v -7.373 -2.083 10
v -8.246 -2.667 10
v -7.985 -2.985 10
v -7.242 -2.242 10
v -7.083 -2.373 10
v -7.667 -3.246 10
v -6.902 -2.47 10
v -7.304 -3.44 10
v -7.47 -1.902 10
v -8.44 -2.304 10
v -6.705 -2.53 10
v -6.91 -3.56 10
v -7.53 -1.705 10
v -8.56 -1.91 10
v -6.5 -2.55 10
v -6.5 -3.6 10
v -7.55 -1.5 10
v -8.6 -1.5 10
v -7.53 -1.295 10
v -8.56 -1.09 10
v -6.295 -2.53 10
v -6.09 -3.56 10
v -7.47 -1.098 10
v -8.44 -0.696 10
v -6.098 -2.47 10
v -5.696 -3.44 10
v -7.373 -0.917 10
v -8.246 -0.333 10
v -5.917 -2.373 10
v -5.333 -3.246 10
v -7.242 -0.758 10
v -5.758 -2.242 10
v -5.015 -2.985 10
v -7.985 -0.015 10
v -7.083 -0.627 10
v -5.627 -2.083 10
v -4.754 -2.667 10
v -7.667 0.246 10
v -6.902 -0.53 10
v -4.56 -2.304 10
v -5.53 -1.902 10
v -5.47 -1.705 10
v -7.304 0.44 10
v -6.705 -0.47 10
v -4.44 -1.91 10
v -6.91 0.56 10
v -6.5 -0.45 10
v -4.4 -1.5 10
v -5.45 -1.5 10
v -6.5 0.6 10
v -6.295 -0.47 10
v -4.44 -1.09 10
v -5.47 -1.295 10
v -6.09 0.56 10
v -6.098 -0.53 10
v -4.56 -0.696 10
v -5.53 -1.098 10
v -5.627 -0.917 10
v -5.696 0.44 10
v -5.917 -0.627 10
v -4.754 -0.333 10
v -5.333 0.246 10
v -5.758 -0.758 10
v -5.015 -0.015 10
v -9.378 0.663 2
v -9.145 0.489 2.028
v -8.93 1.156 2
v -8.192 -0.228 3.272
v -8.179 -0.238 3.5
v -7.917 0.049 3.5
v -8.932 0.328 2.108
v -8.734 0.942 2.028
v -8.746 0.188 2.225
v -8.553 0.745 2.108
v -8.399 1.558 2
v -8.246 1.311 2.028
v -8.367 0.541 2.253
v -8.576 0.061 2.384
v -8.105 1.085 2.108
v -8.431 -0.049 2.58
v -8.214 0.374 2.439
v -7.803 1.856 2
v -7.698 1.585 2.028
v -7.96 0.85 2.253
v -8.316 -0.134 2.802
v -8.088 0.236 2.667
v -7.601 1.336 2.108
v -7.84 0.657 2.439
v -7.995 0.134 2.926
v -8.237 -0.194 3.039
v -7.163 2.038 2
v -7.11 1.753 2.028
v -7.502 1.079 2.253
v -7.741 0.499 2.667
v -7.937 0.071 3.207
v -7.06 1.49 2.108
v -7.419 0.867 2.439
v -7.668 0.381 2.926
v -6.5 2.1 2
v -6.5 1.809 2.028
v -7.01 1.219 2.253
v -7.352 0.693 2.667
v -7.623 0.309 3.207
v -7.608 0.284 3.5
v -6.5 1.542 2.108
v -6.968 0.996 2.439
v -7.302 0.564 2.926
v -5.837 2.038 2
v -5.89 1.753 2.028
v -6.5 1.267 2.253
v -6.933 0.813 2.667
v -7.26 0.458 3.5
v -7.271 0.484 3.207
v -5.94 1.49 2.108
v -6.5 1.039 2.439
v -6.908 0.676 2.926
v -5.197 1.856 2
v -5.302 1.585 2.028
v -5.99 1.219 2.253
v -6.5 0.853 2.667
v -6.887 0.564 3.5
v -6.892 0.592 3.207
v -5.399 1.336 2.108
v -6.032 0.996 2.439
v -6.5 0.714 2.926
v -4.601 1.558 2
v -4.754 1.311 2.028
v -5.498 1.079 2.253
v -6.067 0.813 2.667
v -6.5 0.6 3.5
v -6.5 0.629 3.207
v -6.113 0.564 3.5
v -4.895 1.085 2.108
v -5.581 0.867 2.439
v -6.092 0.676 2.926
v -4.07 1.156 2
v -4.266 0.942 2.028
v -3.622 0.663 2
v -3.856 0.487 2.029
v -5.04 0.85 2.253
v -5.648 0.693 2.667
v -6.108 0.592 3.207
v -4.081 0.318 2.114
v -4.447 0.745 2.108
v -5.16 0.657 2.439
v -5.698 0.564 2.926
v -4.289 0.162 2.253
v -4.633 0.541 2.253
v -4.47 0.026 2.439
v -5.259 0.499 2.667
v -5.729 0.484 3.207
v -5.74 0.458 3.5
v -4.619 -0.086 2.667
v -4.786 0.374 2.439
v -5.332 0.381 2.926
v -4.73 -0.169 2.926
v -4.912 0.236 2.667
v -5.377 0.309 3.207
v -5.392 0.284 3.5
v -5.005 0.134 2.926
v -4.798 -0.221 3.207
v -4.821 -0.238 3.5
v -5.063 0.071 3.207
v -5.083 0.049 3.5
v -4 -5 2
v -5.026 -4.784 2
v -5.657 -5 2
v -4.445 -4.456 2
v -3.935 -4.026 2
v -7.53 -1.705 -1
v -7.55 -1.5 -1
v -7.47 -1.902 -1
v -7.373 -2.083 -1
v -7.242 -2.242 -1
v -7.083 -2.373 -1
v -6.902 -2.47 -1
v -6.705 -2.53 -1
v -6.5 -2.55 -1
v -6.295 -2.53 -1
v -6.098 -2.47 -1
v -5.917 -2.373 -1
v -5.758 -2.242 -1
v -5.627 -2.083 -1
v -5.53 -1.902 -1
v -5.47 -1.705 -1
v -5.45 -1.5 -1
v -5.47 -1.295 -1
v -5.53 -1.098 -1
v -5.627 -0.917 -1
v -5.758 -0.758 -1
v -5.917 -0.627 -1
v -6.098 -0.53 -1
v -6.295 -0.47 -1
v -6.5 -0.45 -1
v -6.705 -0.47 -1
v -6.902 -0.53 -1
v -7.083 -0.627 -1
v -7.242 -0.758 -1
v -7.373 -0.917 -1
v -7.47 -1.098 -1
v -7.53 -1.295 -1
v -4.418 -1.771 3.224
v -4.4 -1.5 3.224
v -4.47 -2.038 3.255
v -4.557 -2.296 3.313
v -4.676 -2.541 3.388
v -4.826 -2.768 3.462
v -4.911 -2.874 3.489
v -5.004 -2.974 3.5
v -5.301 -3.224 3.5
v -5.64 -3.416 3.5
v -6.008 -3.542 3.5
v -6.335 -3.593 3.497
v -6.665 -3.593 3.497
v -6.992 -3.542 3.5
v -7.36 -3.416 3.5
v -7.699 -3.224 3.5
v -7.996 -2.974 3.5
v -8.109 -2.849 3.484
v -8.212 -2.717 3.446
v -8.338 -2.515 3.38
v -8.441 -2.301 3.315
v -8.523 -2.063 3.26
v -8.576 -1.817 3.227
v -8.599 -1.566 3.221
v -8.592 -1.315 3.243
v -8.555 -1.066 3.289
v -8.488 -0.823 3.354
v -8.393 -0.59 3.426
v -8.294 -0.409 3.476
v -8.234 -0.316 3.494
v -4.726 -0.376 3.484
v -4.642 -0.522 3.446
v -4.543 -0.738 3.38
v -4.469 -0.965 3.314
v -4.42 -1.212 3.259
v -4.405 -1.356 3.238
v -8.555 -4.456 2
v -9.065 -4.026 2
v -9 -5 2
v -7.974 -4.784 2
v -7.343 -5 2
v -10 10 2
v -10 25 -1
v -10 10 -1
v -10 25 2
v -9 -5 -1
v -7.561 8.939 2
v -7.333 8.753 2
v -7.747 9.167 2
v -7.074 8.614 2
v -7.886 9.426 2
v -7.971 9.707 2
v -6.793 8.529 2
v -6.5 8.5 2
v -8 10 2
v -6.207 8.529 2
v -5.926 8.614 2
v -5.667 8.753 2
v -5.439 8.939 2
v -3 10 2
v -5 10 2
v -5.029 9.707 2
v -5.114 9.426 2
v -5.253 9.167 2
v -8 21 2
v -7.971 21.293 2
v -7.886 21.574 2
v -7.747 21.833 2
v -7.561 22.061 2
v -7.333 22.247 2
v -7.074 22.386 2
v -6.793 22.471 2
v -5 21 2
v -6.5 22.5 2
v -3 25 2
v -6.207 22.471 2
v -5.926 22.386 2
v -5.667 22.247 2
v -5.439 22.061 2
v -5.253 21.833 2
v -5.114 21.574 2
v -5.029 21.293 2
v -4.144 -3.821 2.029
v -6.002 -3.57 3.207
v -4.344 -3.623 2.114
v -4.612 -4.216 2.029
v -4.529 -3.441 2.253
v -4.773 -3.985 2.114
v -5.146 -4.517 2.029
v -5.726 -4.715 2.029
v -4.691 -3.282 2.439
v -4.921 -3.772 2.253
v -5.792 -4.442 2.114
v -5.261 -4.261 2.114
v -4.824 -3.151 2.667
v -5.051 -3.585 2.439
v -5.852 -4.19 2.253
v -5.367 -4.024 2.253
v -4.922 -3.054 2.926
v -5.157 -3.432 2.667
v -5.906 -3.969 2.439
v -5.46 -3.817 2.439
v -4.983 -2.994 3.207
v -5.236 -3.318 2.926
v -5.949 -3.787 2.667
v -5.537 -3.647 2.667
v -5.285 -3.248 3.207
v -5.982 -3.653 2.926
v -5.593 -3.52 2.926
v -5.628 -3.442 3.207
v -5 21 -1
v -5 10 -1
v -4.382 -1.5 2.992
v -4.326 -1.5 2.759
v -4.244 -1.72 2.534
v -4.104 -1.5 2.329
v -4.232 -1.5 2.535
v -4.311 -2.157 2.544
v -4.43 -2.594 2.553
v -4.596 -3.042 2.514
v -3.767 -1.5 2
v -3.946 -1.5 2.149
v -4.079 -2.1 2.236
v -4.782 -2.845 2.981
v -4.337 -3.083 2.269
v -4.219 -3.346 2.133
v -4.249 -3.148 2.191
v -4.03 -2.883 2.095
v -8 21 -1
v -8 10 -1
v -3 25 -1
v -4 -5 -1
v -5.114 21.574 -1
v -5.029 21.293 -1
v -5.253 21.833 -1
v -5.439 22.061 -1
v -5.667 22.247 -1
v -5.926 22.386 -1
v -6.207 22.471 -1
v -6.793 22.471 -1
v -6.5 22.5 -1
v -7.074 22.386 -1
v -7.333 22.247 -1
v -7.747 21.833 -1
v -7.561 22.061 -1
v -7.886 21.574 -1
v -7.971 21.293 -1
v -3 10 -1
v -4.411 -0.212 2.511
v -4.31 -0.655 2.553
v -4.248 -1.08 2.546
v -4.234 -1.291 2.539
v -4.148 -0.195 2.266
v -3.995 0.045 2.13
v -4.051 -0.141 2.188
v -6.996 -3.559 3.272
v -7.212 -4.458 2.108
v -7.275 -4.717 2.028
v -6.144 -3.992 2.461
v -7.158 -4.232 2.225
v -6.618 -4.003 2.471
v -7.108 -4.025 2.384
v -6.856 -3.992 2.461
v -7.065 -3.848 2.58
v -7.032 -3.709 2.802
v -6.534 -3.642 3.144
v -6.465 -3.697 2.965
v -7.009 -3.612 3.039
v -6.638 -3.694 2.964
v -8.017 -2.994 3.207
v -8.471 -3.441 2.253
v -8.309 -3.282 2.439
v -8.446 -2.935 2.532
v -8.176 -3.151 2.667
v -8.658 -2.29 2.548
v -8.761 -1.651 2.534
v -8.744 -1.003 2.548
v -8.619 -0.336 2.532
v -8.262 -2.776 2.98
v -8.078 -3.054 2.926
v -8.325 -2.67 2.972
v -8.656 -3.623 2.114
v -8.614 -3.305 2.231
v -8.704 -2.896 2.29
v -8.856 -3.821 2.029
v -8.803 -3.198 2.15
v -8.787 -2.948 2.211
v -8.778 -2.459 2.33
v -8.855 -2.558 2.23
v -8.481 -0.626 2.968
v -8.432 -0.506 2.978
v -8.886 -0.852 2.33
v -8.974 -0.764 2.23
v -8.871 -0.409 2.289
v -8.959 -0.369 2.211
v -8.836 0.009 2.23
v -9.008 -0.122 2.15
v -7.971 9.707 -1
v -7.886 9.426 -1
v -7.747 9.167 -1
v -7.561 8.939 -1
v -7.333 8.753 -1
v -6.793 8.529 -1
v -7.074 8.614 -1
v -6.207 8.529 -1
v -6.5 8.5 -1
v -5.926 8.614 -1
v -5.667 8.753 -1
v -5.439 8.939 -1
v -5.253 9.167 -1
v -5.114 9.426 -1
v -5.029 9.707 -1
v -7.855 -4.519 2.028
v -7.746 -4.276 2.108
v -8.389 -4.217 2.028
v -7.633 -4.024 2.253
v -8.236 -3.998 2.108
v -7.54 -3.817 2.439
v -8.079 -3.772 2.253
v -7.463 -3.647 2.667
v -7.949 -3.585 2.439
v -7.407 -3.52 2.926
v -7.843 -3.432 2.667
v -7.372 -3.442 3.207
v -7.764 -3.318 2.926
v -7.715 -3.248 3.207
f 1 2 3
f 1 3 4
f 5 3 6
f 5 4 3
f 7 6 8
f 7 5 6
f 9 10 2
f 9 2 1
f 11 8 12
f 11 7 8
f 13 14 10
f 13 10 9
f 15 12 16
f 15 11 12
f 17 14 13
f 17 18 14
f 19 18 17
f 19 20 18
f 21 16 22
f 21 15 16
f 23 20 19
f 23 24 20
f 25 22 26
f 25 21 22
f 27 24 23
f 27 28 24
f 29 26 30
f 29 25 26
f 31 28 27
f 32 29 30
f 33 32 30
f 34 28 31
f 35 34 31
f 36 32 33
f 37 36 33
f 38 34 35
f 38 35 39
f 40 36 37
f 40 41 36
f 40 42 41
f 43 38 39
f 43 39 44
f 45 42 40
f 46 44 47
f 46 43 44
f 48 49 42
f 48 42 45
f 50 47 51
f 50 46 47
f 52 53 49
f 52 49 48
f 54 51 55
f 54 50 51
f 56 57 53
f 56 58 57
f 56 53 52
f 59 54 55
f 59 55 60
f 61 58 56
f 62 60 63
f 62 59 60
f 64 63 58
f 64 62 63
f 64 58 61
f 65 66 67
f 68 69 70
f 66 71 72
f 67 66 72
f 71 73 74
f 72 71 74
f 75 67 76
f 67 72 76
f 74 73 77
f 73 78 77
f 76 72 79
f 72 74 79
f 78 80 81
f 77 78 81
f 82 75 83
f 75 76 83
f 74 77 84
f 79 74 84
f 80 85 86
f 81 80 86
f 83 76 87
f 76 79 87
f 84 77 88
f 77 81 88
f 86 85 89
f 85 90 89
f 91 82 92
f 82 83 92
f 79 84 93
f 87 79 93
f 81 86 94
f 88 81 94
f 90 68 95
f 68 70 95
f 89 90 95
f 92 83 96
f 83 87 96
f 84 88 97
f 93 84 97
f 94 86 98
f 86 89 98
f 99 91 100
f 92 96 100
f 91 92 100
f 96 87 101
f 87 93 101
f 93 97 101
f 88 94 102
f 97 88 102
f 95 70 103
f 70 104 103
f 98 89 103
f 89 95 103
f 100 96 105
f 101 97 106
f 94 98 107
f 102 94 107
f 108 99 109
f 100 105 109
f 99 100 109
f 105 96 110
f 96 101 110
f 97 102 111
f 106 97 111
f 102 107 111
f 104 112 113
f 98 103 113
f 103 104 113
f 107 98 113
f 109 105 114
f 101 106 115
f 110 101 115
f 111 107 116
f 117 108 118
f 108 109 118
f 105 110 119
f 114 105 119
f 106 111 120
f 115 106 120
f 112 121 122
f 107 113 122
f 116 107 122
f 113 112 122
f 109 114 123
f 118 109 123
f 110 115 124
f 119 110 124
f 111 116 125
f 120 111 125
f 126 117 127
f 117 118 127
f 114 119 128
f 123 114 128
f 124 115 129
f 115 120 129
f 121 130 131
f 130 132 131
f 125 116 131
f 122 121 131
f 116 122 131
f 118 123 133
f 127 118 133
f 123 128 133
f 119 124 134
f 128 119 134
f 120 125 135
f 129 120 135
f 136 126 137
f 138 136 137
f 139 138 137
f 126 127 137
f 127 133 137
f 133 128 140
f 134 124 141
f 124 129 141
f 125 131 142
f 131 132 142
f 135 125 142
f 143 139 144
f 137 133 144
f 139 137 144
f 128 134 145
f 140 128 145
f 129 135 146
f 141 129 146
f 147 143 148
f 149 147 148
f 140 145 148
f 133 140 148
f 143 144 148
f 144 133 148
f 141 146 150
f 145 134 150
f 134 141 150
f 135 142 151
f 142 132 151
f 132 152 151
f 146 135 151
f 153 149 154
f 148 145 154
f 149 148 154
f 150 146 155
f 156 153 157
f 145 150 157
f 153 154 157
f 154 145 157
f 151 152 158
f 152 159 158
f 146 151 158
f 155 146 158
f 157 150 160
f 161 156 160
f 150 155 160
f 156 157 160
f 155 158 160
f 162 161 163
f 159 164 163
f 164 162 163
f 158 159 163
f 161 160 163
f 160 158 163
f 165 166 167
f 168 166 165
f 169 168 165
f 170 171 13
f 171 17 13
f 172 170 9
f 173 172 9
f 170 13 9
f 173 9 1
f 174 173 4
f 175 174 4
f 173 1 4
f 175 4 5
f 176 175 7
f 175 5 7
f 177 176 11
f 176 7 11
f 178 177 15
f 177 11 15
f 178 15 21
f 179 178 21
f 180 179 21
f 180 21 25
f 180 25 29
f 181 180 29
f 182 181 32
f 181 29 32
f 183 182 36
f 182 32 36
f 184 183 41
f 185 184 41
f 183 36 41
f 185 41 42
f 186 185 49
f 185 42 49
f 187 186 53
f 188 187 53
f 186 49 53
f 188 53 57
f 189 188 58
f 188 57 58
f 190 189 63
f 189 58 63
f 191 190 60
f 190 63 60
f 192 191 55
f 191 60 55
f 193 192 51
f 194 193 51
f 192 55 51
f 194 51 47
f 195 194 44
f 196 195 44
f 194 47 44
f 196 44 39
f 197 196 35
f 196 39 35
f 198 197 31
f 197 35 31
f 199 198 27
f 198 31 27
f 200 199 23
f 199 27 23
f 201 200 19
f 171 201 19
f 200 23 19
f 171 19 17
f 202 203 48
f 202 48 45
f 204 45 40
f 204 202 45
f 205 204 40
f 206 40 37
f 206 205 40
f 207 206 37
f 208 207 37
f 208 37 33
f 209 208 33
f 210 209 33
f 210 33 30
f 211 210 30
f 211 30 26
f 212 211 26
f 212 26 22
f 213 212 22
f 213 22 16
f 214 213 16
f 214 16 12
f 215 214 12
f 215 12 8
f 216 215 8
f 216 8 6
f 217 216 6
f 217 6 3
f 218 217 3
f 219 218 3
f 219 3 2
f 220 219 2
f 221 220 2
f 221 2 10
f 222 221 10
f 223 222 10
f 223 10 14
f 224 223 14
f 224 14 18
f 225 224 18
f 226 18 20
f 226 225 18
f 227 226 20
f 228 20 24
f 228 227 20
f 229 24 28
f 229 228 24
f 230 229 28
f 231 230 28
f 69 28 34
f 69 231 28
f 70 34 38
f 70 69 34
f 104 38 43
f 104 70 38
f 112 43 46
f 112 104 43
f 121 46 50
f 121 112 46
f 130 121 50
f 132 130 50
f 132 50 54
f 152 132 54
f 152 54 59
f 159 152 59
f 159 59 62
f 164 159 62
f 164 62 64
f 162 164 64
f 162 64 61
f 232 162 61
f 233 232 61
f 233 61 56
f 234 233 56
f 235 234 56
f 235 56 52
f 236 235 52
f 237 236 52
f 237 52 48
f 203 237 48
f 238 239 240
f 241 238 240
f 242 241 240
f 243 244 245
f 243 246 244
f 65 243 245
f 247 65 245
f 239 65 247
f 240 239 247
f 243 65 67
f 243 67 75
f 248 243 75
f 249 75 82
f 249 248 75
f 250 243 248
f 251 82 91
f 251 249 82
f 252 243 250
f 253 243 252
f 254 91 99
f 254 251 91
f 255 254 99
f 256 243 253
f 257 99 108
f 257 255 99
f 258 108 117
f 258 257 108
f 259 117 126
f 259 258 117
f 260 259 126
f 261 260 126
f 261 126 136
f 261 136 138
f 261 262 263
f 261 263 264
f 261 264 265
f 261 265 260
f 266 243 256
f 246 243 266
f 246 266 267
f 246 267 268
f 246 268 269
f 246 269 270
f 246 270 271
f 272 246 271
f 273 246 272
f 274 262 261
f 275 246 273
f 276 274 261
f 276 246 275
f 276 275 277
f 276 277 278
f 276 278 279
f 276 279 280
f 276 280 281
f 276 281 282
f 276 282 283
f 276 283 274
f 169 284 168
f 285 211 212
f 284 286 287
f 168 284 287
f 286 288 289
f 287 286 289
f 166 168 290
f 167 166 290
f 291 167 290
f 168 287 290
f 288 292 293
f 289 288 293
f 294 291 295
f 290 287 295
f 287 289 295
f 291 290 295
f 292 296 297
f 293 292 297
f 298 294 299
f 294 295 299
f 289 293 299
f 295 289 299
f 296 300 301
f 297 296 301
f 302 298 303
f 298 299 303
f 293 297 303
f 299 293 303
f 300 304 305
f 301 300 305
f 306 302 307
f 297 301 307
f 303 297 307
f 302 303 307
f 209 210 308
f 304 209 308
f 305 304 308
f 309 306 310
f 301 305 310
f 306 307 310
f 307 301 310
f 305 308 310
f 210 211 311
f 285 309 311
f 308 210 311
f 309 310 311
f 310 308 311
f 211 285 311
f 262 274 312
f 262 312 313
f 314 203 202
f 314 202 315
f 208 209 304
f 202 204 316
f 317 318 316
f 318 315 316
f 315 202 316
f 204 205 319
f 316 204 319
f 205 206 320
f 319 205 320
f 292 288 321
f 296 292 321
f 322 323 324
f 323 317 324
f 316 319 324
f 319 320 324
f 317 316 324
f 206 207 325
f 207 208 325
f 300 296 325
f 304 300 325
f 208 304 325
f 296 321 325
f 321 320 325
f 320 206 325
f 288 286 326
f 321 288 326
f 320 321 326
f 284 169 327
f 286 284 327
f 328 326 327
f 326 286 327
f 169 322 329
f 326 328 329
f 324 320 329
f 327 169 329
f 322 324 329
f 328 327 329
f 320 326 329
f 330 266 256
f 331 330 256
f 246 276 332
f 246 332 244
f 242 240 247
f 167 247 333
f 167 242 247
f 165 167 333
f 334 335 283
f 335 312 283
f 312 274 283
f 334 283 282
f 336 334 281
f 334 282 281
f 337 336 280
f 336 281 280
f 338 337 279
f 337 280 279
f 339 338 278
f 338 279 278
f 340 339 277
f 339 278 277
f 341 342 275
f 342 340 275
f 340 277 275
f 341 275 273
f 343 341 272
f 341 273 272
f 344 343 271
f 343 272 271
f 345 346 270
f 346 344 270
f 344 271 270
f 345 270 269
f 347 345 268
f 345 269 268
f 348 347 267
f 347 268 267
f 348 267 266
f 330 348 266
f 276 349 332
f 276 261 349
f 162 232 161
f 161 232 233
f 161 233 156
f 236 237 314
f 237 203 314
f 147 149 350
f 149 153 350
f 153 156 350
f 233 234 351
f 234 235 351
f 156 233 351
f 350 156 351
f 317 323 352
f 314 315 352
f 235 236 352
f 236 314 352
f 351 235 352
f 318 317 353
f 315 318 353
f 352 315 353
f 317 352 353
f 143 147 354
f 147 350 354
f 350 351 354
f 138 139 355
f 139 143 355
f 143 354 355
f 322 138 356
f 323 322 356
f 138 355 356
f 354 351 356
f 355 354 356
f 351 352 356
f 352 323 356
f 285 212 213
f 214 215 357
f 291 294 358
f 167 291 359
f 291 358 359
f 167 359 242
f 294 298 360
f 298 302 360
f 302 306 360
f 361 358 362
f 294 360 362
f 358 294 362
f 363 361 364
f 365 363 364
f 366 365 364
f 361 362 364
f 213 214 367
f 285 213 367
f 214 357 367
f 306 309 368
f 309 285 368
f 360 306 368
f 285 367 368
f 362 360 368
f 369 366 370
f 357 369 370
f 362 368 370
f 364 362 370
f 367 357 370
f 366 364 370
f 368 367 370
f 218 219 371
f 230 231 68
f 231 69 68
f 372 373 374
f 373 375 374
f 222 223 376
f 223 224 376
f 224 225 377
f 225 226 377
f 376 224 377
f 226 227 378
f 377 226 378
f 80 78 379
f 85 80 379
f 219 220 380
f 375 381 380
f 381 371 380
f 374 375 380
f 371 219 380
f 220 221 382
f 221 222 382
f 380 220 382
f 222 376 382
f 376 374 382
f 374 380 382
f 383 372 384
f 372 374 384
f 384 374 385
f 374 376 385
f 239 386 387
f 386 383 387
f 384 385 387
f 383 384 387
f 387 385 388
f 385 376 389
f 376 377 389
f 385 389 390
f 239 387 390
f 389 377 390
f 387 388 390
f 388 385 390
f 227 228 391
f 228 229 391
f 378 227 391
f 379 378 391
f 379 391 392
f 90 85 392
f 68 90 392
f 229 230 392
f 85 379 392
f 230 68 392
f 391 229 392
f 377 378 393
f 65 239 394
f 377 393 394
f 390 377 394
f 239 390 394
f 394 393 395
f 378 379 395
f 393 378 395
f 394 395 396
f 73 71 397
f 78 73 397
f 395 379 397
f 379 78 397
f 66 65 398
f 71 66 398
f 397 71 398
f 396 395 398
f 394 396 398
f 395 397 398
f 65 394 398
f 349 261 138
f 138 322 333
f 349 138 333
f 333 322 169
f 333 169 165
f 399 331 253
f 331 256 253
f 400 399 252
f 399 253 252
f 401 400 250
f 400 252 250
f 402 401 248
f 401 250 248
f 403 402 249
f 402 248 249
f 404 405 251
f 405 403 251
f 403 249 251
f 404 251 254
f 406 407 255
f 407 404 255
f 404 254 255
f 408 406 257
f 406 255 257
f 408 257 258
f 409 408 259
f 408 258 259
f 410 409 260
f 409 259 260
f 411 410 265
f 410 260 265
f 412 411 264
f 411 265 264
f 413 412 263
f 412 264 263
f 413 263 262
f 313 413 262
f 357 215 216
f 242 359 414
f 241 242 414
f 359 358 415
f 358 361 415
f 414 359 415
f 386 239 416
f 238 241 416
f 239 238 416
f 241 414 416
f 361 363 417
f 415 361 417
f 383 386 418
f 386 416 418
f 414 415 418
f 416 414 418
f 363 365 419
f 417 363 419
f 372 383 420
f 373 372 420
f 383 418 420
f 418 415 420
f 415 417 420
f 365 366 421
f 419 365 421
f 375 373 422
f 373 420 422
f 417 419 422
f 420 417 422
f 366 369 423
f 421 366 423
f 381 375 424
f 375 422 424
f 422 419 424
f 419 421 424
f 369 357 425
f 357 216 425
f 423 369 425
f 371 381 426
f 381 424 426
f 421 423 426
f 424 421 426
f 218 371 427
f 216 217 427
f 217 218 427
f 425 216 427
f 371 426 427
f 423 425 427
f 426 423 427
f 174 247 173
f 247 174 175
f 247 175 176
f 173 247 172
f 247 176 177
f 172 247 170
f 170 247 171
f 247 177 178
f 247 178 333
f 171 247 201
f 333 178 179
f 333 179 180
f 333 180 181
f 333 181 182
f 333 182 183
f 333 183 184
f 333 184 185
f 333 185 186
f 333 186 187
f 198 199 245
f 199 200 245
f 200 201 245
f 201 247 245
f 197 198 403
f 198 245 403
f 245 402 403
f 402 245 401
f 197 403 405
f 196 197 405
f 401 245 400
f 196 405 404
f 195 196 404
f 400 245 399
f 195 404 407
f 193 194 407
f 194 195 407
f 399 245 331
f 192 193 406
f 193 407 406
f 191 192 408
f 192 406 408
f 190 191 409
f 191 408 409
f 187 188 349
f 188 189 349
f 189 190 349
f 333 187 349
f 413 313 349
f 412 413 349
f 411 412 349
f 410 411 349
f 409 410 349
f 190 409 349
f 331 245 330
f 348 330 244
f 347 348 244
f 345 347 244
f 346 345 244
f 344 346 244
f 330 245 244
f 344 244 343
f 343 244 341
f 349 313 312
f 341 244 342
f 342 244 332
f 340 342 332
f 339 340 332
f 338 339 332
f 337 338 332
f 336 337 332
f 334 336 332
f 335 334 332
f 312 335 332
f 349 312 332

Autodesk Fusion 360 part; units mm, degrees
sketch "Sketch1" plane through (0, 0, 0) normal (0, 0, 1) x (1, 0, 0)
  line L0 (-10, 25) -> (-3, 25)
  line L1 (-3, 25) -> (-3, -5)
  line L2 (-3, -5) -> (-10, -5)
  line L3 (-10, -5) -> (-10, 25)
  line L4 (-10, -5) -> (-3, 2)
  line L5 (-10, -5) -> (-0.1005, -5) construction
  line L6 (-3, -5) -> (-10, 2)
  circle A0 centre (-6.5, -1.5) radius 2
  line L7 (-10, -5) -> (-9, -5)
  line L8 (-9, -5) -> (-10, 10)
  line L9 (-3, -5) -> (-4, -5)
  line L10 (-4, -5) -> (-3, 10)
  line L11 (-10, 25) -> (-3, 18)
  line L12 (-10, 25) -> (-0.1005, 25) construction
  line L13 (-3, 25) -> (-10, 18)
  line L14 (-6.5, 25) -> (-6.5, 22)
  line L15 (-6.5, 22) -> (-6.5, 9)
  line L16 (-5, 21) -> (-8, 21)
  line L17 (-8, 21) -> (-8, 10)
  line L18 (-8, 10) -> (-5, 10)
  line L19 (-5, 10) -> (-5, 21)
  line L20 (-5, 21) -> (-8, 10) construction
  line L21 (-8, 21) -> (-5, 10) construction
  circle A1 centre (-6.5, 10) radius 1.5
  circle A2 centre (-6.5, 21) radius 1.5
  point P0 (-6.5, 15.5)
  dimension "d1" = 7
  dimension "d2" = 30
  dimension "d3" = 45
  dimension "d4" = 4
  dimension "d5" = 45
  dimension "d6" = 3
  dimension "d7" = 13
  dimension "d8" = 3
  dimension "d9" = 11
  dimension "d10" = 3
  dimension "d11" = 3
extrude "Extrude1" add sketch "Sketch1" along normal blind 2 contours L3 L11 L13 L17 A2 | L0 L11 L14 A2 | L0 L13 L14 A2 | L1 L3 L4 L6 A0 L8 L10 L11 L13 L17 L19 A1 | L1 L11 L13 L19 A2 | L4 L6 A0 L8 | L2 L4 L6 A0 L8 L10 | L4 L6 A0 L10
extrude "Extrude2" add sketch "Sketch1" along normal blind 10 contours L4 L6 A0 | L4 L6 A0 | L4 L6 A0 | L4 L6 A0
sketch "Sketch2" plane through (0, 0, 10) normal (0, 0, 1) x (-1, 0, 0)
  circle A0 centre (6.5, 1.5) radius 2
  circle A1 centre (6.5, 1.5) radius 1.05
  dimension "d16" = 2.1
extrude "Extrude3" cut sketch "Sketch2" against normal blind 13 contours A1
move_face "OffsetFaces1" offset 0.1 1 faces at (-4.5025, -1.4003, 4.6667)
fillet "Fillet1" radius 1.5 1 edges at (-8.4579, -0.7406, 2)
extrude "Extrude4" add 1 faces at (-6.5374, 24.1653, 0) along direction (0, 0, -1) blind 1
